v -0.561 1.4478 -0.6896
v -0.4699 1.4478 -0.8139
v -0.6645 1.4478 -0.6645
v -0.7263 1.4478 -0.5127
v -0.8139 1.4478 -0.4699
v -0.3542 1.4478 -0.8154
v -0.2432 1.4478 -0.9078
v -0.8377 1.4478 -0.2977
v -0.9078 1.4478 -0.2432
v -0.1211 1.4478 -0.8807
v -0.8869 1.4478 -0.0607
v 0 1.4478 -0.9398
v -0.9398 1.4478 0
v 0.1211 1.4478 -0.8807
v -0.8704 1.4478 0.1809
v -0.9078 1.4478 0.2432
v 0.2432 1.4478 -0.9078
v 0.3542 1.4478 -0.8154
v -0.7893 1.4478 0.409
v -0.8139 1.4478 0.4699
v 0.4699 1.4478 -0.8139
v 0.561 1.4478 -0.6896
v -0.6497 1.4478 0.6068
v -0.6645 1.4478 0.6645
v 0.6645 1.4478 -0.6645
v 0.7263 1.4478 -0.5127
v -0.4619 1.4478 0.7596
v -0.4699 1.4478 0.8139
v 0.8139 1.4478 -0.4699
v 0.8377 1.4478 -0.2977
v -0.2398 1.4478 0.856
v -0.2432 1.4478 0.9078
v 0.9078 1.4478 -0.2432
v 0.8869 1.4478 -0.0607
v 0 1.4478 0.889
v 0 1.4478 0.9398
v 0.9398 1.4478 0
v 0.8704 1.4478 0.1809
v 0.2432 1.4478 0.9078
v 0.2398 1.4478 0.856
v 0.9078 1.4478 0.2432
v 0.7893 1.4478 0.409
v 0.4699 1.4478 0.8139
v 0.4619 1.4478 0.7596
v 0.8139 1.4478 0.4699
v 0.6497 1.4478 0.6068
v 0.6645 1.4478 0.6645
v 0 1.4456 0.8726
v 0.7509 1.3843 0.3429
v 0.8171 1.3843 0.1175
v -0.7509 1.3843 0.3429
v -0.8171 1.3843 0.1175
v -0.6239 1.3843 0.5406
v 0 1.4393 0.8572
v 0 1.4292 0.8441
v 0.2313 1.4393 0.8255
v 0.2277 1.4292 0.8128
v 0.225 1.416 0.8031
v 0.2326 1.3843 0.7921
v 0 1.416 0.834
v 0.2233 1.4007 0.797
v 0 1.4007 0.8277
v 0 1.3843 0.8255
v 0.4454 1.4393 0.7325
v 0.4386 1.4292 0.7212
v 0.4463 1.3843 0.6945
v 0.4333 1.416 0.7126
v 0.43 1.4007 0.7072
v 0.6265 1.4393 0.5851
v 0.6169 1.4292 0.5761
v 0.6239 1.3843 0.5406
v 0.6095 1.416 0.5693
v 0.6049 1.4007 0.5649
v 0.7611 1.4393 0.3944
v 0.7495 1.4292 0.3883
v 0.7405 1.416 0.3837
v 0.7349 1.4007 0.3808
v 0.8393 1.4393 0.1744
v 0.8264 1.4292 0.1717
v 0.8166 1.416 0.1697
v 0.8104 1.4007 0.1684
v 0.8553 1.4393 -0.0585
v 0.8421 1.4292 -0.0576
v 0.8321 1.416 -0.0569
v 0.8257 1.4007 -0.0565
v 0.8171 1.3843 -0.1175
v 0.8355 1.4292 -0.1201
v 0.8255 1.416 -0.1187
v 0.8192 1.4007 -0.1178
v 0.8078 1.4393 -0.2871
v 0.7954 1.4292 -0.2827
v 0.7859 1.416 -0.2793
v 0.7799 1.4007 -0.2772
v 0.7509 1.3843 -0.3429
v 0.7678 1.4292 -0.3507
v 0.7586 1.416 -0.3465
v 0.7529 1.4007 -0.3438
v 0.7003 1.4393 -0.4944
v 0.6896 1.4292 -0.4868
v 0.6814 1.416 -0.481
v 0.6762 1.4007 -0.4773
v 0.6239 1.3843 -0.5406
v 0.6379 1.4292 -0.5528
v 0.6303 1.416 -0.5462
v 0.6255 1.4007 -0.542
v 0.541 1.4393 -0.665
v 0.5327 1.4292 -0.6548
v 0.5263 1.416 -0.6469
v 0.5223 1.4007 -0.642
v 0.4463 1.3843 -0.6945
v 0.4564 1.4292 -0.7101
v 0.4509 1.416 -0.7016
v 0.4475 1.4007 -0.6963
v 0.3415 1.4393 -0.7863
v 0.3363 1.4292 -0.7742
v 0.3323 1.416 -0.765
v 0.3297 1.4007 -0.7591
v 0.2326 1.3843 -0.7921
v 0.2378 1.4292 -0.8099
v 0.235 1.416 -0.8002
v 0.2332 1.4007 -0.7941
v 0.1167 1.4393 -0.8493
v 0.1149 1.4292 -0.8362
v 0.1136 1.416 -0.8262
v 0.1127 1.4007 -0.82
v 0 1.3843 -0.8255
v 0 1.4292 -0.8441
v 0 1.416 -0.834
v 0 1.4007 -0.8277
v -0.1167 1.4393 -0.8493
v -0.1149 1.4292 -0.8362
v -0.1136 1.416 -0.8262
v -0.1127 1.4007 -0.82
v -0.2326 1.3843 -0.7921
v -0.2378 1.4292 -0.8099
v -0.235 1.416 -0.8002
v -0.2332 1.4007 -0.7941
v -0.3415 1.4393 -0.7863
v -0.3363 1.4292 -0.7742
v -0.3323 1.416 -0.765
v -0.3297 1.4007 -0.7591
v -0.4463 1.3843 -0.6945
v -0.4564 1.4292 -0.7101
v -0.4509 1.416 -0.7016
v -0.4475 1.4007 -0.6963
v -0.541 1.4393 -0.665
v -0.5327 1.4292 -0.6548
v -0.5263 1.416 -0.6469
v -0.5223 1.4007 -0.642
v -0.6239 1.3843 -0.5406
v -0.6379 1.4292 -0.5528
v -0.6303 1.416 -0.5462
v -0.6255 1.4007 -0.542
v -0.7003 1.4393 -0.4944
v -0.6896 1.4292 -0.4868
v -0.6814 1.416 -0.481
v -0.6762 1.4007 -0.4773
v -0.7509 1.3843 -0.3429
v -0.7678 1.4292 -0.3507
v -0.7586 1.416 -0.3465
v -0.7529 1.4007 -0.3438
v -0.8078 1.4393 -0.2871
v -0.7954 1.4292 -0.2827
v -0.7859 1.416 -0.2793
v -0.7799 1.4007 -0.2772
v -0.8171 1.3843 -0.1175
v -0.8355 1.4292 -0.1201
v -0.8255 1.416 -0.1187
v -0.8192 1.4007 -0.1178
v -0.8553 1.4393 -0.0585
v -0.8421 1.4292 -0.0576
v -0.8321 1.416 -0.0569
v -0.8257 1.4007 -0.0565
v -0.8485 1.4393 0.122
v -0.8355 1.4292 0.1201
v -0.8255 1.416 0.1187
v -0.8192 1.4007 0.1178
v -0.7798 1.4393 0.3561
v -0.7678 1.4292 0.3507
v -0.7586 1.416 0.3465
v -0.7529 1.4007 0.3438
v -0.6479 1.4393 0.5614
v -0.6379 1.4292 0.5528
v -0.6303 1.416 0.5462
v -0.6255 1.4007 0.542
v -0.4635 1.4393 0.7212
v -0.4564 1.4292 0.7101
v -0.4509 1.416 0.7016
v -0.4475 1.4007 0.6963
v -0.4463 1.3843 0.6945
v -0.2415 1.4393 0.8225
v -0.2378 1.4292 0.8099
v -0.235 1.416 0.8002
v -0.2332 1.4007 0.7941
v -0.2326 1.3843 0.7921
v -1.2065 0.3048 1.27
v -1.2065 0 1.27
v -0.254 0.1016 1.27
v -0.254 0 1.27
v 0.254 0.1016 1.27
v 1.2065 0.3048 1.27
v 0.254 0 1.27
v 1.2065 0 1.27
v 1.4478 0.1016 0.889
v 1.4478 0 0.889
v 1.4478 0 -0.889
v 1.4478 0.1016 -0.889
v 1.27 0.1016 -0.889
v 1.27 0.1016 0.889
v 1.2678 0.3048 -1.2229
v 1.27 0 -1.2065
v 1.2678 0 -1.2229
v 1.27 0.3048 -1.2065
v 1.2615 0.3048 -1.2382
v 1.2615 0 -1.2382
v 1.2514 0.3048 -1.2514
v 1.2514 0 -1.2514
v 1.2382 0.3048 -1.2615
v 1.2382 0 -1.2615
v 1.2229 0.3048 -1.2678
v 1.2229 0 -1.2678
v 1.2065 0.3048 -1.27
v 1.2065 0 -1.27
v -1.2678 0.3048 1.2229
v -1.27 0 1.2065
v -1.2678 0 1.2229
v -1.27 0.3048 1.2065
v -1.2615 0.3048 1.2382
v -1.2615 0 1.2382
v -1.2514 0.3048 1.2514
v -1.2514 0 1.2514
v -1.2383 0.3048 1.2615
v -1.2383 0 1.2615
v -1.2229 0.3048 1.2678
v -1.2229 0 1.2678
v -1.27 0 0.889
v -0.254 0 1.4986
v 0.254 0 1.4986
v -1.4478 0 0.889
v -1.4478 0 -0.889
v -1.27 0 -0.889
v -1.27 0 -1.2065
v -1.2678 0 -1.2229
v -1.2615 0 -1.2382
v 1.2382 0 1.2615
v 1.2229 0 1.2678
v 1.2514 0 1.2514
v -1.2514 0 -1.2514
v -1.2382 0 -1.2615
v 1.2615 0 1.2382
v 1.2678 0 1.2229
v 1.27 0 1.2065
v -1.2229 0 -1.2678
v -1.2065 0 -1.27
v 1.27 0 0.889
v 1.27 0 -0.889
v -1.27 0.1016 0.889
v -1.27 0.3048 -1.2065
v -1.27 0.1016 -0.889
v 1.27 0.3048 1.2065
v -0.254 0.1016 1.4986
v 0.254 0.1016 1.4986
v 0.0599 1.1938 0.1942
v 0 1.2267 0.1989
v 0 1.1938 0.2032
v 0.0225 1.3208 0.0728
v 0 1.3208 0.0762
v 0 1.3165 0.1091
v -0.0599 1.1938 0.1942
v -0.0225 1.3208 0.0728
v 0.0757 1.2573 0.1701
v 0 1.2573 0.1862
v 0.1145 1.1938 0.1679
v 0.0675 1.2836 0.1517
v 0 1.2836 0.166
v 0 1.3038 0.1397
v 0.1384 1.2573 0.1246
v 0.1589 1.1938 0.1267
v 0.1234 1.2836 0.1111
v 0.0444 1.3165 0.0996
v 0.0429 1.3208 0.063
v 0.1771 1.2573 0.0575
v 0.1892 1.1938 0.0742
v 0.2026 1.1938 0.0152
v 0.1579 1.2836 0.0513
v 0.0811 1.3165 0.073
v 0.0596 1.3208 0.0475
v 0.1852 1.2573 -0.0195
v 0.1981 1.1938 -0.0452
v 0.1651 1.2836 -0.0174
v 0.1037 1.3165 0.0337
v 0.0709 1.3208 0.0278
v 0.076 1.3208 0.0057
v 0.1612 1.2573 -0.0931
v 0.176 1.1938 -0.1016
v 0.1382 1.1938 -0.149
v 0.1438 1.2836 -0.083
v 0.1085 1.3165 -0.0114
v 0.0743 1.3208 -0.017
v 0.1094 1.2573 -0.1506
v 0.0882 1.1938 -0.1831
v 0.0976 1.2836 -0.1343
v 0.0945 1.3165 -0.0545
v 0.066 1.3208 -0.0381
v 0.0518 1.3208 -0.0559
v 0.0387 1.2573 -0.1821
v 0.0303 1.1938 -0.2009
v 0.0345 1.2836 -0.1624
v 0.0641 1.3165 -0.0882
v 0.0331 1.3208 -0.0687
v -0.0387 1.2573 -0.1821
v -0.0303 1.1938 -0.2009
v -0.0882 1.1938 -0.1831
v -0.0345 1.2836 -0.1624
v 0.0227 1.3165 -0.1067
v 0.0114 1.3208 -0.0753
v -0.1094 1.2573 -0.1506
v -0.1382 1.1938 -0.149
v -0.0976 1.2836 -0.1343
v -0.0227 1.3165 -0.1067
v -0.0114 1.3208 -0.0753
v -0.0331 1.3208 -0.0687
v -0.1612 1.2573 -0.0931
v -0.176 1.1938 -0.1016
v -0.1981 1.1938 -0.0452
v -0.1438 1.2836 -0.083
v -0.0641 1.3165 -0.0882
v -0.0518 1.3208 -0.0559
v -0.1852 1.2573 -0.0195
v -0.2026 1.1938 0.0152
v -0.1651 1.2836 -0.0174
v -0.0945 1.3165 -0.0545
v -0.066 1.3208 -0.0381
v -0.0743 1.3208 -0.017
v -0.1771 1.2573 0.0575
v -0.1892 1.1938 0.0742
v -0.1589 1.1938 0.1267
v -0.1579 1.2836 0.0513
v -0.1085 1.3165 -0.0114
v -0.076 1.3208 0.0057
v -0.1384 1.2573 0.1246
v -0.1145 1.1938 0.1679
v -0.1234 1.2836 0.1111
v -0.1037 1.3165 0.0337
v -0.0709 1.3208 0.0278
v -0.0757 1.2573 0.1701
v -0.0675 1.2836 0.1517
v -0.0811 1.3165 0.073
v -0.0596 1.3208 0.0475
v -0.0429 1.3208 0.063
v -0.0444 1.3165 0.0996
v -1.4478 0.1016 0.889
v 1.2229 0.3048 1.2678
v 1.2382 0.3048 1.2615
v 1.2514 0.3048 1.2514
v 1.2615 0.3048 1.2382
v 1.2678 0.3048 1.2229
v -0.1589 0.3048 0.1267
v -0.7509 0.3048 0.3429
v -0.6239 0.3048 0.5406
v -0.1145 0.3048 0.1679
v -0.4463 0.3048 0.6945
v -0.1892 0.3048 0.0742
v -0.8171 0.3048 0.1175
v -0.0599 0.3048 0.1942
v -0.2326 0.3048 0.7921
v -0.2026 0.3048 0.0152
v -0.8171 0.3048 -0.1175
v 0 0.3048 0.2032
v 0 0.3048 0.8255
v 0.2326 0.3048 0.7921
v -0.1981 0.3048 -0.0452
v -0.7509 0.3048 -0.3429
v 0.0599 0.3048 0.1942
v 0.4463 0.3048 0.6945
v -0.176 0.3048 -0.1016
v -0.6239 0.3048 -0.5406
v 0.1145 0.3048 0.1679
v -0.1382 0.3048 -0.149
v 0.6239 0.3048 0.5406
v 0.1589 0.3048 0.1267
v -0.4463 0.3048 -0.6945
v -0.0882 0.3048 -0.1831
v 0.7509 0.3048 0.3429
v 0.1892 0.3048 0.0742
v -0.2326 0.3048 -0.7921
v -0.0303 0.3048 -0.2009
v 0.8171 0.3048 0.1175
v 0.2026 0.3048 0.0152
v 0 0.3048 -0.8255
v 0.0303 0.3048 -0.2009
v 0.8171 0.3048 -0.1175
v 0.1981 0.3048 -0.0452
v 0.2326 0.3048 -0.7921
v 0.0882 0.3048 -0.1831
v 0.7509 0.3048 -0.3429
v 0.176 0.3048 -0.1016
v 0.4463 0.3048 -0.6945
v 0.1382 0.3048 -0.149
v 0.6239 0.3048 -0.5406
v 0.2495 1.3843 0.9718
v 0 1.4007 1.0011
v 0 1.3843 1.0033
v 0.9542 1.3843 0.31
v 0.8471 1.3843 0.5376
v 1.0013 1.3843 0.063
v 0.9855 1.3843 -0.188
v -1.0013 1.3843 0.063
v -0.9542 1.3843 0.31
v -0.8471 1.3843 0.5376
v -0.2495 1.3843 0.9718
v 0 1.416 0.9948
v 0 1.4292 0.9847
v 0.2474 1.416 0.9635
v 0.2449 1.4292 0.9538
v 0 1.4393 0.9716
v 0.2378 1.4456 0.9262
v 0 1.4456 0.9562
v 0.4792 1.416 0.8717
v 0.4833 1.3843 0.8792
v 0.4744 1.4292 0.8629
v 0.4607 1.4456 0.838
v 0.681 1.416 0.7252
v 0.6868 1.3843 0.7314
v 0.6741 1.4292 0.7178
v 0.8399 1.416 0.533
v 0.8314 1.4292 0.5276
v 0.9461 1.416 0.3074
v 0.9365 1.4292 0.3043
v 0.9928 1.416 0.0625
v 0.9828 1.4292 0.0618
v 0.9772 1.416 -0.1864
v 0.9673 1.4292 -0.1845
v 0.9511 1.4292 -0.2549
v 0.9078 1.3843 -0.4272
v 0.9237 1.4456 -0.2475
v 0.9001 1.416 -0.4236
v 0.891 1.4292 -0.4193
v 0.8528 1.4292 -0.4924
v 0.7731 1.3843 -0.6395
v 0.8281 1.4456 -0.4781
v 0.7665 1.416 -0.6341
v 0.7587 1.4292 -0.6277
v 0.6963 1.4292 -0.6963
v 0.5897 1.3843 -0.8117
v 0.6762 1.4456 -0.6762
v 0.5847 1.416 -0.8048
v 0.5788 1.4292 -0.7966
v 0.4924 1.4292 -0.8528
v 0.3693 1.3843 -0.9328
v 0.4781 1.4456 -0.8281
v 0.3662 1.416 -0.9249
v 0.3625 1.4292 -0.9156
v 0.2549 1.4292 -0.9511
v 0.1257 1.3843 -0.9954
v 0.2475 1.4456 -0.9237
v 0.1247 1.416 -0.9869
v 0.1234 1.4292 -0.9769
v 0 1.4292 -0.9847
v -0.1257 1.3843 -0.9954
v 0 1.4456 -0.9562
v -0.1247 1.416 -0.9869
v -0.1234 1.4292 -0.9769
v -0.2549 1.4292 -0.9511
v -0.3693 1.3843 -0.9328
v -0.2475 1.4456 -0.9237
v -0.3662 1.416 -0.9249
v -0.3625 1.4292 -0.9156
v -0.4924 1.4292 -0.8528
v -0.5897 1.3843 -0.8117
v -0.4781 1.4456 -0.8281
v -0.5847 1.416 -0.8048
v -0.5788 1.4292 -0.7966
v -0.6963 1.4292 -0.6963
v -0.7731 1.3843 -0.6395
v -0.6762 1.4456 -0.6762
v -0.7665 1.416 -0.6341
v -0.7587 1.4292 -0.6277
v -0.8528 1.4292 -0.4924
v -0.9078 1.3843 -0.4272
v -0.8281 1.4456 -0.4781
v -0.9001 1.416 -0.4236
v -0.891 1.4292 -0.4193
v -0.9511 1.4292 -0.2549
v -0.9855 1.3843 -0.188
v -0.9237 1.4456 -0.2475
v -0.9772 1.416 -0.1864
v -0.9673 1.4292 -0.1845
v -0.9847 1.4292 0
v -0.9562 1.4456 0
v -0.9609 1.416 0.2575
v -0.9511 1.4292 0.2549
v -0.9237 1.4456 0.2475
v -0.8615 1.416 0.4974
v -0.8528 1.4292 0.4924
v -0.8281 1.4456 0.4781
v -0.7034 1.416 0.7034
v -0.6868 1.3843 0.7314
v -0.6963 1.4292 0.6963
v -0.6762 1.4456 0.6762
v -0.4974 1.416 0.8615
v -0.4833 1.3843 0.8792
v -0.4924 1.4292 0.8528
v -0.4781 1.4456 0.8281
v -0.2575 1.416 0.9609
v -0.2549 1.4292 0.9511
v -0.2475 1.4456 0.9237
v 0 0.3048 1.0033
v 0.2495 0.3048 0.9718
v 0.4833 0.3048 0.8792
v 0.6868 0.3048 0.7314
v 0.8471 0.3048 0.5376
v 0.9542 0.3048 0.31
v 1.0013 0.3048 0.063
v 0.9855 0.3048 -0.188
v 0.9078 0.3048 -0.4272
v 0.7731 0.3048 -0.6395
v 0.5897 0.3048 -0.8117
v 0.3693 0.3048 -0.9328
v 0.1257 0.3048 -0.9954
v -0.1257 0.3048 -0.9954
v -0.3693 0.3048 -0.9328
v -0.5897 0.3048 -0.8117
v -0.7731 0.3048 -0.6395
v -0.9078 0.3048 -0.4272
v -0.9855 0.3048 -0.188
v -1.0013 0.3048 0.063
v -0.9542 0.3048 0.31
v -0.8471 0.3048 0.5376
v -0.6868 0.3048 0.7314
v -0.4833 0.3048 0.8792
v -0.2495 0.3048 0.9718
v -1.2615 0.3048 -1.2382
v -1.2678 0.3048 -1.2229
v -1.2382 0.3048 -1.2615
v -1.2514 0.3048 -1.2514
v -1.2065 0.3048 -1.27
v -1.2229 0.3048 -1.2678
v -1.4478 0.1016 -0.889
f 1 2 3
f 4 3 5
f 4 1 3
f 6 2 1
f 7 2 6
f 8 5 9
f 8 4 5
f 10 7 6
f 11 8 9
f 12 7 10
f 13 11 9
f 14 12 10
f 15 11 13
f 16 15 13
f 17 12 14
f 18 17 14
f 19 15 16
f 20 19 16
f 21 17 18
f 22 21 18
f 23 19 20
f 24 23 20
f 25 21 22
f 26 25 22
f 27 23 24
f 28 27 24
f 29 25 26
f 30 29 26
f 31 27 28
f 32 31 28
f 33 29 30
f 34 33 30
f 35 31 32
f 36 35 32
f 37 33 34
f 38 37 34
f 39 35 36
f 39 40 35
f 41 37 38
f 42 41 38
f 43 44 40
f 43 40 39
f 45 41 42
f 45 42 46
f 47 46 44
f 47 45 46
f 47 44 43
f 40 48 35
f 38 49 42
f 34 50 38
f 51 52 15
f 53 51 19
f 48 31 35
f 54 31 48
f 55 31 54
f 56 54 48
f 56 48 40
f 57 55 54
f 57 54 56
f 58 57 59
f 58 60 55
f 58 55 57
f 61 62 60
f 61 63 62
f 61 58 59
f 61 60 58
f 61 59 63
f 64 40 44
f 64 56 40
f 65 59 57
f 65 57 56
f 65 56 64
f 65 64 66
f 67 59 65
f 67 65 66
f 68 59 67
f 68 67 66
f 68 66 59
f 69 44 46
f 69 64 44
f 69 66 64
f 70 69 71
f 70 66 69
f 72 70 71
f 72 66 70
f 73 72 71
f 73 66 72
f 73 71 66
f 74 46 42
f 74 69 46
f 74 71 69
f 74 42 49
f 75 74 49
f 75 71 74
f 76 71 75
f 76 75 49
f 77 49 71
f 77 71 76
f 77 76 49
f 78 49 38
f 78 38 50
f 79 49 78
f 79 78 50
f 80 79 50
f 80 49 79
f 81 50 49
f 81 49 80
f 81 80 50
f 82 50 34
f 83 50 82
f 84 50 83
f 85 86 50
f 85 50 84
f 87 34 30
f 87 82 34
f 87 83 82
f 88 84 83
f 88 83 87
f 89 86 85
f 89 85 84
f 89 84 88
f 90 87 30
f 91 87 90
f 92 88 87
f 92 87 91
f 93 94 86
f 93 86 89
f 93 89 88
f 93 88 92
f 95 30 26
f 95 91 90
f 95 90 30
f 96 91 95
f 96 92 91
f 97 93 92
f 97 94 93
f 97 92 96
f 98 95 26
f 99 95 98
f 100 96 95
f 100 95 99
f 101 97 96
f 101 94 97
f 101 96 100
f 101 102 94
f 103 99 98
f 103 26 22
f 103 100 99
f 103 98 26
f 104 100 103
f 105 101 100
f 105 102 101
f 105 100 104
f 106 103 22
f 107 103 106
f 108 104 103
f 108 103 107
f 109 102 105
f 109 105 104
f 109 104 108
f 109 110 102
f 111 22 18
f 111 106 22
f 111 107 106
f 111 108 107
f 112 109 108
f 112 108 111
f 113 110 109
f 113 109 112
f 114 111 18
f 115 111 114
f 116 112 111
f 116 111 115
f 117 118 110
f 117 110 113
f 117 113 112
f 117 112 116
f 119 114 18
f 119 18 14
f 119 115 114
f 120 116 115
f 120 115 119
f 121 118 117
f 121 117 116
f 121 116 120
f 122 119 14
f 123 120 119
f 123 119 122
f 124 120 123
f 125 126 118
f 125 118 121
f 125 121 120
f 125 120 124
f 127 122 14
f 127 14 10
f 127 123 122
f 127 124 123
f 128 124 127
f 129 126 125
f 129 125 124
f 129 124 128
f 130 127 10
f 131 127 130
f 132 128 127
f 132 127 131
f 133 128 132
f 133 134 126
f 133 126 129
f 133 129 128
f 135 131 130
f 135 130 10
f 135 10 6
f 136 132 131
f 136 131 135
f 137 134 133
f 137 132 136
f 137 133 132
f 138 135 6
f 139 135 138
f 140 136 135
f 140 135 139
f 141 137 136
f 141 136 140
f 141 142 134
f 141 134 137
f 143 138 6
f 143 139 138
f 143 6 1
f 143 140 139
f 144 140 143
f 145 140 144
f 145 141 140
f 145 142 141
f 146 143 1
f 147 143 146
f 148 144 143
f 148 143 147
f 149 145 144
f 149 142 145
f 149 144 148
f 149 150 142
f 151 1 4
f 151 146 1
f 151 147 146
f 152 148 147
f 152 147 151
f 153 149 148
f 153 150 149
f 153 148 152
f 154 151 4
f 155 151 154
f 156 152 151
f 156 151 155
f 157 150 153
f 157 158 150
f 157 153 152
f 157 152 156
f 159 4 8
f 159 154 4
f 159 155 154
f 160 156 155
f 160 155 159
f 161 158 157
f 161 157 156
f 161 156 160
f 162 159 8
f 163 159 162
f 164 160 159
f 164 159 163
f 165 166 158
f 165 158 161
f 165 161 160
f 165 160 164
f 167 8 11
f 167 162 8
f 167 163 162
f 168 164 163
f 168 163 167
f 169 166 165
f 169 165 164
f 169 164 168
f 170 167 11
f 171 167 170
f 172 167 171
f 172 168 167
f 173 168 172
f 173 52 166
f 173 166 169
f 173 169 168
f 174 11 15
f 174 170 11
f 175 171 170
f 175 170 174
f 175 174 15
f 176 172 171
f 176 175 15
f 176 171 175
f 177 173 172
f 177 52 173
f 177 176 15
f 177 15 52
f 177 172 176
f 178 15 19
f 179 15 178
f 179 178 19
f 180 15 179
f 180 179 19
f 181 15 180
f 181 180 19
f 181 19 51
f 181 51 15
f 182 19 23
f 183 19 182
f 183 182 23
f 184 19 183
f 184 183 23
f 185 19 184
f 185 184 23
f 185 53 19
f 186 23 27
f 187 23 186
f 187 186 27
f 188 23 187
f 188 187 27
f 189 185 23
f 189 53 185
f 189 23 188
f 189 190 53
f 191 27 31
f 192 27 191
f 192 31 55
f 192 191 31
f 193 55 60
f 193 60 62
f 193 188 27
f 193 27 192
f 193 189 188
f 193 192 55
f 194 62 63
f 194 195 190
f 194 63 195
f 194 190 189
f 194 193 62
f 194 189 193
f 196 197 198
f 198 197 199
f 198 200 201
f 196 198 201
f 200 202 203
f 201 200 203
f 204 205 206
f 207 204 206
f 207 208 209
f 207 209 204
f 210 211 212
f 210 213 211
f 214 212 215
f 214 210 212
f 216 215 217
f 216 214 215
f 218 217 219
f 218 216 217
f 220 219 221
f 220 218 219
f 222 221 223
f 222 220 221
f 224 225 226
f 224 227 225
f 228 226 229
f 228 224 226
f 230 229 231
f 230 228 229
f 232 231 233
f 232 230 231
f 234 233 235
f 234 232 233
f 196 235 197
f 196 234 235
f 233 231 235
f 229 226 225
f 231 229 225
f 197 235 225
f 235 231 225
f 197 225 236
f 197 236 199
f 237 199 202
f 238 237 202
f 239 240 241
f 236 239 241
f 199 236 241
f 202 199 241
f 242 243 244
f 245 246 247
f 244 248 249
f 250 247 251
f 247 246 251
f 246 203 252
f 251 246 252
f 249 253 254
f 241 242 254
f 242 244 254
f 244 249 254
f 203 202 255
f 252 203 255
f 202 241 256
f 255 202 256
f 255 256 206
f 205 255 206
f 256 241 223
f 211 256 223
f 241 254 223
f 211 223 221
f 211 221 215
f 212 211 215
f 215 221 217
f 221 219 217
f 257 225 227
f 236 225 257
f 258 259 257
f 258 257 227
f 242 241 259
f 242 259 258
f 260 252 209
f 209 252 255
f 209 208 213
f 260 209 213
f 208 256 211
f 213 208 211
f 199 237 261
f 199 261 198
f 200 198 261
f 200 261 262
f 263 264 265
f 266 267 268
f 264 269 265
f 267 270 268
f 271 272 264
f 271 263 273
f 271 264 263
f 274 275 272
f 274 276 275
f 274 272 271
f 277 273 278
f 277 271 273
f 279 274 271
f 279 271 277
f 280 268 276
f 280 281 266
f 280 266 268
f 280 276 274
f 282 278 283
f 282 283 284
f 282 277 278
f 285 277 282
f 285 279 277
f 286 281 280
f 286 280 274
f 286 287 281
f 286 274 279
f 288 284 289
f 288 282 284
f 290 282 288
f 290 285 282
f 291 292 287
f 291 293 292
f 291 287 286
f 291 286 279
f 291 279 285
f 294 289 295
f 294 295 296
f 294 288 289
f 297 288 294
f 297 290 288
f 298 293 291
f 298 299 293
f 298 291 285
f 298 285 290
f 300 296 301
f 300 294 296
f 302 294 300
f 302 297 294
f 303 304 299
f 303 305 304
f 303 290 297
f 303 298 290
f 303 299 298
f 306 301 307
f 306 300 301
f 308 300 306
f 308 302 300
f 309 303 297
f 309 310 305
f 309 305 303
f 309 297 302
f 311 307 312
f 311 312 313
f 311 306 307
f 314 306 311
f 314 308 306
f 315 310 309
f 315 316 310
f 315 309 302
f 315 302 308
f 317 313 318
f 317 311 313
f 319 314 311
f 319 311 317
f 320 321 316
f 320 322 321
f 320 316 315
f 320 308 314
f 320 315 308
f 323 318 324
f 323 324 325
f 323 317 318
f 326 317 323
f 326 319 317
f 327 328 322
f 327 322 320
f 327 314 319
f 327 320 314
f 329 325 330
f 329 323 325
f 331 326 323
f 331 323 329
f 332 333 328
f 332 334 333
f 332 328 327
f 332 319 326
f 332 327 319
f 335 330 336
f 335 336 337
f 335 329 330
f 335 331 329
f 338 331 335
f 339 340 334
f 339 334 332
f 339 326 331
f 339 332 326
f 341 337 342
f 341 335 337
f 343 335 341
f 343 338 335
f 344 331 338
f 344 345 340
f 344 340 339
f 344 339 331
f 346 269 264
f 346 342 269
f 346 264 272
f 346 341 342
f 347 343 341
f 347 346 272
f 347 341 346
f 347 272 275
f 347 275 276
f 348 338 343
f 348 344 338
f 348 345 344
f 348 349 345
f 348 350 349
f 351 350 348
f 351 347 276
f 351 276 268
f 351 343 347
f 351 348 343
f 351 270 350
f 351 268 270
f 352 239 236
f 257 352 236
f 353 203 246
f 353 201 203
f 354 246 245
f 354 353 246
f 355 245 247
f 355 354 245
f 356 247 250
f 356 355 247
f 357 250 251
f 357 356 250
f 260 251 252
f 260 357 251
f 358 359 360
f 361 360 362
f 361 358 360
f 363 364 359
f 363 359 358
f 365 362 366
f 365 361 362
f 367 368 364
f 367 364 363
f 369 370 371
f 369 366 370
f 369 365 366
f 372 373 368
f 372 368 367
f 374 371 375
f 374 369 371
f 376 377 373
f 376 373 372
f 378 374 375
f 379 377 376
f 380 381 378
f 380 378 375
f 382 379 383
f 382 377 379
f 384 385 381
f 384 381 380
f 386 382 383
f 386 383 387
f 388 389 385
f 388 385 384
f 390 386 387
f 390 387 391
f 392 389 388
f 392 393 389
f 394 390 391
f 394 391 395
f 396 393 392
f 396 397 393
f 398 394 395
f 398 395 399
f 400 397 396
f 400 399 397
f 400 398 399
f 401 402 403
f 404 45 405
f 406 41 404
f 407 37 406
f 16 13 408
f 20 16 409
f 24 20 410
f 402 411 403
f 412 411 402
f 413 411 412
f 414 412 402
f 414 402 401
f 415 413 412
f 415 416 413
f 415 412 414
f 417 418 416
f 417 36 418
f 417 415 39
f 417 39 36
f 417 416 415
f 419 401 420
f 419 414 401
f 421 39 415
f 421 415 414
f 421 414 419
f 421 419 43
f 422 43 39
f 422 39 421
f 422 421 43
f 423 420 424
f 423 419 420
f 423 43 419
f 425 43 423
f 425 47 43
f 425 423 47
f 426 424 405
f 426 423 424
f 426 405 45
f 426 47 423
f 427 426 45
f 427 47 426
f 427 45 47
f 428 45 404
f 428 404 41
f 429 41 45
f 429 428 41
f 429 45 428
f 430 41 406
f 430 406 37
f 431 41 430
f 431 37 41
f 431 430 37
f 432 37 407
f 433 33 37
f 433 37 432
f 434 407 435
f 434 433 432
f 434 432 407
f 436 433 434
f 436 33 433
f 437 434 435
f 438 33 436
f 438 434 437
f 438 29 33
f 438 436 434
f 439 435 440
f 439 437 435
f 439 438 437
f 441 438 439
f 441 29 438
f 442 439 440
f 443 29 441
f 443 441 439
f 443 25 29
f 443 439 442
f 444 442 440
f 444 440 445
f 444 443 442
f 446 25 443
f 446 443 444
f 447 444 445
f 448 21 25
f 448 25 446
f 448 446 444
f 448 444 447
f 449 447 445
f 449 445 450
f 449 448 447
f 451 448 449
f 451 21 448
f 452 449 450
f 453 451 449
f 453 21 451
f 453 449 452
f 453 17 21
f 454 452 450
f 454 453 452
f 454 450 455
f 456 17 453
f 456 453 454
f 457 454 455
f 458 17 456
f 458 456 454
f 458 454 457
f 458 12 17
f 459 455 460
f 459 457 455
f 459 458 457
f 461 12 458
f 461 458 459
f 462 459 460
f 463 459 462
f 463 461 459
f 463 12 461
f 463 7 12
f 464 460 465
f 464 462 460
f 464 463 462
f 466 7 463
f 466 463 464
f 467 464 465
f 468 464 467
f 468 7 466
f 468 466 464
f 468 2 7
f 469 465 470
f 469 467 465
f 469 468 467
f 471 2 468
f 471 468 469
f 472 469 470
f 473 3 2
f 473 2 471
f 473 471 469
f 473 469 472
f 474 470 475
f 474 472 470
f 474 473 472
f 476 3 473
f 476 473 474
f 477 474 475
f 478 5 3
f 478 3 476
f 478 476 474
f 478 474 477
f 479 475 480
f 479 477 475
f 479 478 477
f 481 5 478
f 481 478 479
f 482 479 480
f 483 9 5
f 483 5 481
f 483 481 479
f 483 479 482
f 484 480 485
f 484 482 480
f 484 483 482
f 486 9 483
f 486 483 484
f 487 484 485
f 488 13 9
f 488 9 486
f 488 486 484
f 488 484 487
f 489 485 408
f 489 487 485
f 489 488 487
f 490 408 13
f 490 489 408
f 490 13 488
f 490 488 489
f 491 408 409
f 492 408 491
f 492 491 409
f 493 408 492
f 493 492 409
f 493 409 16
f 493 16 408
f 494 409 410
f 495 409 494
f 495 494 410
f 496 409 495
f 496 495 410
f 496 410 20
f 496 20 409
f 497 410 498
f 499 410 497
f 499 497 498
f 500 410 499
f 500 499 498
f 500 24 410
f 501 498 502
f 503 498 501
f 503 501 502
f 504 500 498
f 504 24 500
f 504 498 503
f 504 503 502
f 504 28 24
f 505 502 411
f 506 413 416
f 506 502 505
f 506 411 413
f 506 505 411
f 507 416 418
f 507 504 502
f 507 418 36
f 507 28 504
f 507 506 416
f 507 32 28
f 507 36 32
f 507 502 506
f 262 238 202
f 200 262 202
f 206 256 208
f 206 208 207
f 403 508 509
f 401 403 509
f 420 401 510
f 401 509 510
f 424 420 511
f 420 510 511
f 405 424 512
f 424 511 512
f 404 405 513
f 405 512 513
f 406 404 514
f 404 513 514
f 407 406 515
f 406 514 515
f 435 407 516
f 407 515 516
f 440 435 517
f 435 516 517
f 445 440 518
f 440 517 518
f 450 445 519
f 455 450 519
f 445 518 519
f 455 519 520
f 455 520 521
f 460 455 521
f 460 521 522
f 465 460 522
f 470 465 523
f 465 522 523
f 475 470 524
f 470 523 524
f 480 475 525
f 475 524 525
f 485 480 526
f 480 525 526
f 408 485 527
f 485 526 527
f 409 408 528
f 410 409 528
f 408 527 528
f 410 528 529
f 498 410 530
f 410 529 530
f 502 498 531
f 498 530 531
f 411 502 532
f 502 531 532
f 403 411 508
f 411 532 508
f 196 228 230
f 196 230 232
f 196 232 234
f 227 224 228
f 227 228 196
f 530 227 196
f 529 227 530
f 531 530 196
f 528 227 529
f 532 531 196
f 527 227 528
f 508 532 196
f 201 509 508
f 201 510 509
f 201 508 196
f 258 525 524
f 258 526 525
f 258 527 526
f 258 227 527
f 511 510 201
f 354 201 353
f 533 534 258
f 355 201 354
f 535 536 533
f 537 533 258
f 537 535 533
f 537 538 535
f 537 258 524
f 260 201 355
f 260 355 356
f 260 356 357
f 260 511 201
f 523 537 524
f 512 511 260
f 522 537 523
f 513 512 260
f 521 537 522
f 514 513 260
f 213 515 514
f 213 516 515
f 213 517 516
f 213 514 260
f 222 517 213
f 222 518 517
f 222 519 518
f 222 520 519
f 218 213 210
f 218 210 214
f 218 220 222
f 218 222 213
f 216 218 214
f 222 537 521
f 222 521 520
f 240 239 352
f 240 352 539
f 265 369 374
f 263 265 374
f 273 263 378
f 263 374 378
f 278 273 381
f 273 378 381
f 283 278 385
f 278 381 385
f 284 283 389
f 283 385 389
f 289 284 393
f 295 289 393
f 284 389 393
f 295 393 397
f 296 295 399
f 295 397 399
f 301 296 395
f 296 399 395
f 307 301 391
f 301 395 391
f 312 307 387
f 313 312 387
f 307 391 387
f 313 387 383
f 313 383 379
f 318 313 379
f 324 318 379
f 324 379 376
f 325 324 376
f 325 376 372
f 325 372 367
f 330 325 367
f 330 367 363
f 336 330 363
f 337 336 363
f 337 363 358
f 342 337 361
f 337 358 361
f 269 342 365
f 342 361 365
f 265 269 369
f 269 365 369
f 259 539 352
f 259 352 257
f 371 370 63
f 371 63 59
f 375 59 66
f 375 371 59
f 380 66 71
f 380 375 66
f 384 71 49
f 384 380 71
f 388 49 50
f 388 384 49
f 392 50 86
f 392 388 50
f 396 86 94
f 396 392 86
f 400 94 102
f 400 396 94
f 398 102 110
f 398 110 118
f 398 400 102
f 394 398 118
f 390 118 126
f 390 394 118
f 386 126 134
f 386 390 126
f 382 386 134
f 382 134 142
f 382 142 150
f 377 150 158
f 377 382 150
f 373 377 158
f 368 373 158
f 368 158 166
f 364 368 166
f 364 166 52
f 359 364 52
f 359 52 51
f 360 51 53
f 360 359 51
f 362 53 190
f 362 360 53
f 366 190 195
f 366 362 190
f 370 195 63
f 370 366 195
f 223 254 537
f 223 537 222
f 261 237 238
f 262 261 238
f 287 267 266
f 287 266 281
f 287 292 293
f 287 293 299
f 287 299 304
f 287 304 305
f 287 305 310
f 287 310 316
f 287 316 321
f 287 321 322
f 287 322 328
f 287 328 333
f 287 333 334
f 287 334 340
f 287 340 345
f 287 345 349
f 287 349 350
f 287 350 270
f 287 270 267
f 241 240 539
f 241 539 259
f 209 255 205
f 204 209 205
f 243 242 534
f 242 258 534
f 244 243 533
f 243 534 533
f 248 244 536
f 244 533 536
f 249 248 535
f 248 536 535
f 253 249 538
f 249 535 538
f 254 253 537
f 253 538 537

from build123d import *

# Parameters (mm, degrees)
SKETCH1_W           = 2.54
SKETCH1_H           = 2.54
BOSS_EXTRUDE1_DEPTH = 0.3048
FILLET2_R           = 0.0635
SKETCH2_R           = 1.0033
SKETCH2_R_2         = 0.8255
BOSS_EXTRUDE2_DEPTH = 1.143
FILLET3_R           = 0.0635
SKETCH3_R           = 0.2032
BOSS_EXTRUDE3_DEPTH = 1.016
FILLET1_R           = 0.127
SKETCH4_W           = 0.508
SKETCH4_H           = 0.2286
SKETCH4_W_2         = 0.1778
SKETCH4_H_2         = 1.778
BOSS_EXTRUDE4_DEPTH = 0.1016


with BuildPart() as part:
    # Sketch1 → Boss-Extrude1 (new body)
    with BuildSketch(Plane(origin=(0, 0, 0), x_dir=(1, 0, 0), z_dir=(0, 1, 0))):
        Rectangle(SKETCH1_W, SKETCH1_H)
    extrude(amount=BOSS_EXTRUDE1_DEPTH)

    # Fillet2
    fillet2_edges = [part.edges().sort_by_distance(p)[0] for p in [
        (1.27, 0.1524, 1.27),
        (-1.27, 0.1524, 1.27),
        (-1.27, 0.1524, -1.27),
        (1.27, 0.1524, -1.27),
    ]]
    fillet(fillet2_edges, radius=FILLET2_R)

    # Sketch2 → Boss-Extrude2 (add)
    with BuildSketch(Plane(origin=(0, 0.3048, 0), x_dir=(1, 0, 0), z_dir=(0, 1, 0))):
        with Locations(Location((0, 0, 0), (0, 0, 270))):
            Circle(SKETCH2_R)
        with Locations(Location((0, 0, 0), (0, 0, 270))):
            Circle(SKETCH2_R_2, mode=Mode.SUBTRACT)
    extrude(amount=BOSS_EXTRUDE2_DEPTH)

    # Fillet3
    fillet3_edges = [part.edges().sort_by_distance(p)[0] for p in [
        (0, 1.4478, -1.0033),
        (0, 1.4478, -0.8255),
    ]]
    fillet(fillet3_edges, radius=FILLET3_R)

    # Sketch3 → Boss-Extrude3 (add)
    with BuildSketch(Plane(origin=(0, 0.3048, 0), x_dir=(1, 0, 0), z_dir=(0, 1, 0))):
        with Locations(Location((0, 0, 0), (0, 0, 270))):
            Circle(SKETCH3_R)
    extrude(amount=BOSS_EXTRUDE3_DEPTH)

    # Fillet1
    fillet1_edges = [part.edges().sort_by_distance(p)[0] for p in [
        (0, 1.3208, -0.2032),
    ]]
    fillet(fillet1_edges, radius=FILLET1_R)

    # Sketch4 → Boss-Extrude4 (add)
    with BuildSketch(Plane(origin=(0, 0, 0), x_dir=(1, 0, 0), z_dir=(0, 1, 0))):
        with Locations((0, -1.3843)):
            Rectangle(SKETCH4_W, SKETCH4_H)
        with Locations((1.3589, 0)):
            Rectangle(SKETCH4_W_2, SKETCH4_H_2)
        with Locations((-1.3589, 0)):
            Rectangle(SKETCH4_W_2, SKETCH4_H_2)
    extrude(amount=BOSS_EXTRUDE4_DEPTH)


solid = part.part
